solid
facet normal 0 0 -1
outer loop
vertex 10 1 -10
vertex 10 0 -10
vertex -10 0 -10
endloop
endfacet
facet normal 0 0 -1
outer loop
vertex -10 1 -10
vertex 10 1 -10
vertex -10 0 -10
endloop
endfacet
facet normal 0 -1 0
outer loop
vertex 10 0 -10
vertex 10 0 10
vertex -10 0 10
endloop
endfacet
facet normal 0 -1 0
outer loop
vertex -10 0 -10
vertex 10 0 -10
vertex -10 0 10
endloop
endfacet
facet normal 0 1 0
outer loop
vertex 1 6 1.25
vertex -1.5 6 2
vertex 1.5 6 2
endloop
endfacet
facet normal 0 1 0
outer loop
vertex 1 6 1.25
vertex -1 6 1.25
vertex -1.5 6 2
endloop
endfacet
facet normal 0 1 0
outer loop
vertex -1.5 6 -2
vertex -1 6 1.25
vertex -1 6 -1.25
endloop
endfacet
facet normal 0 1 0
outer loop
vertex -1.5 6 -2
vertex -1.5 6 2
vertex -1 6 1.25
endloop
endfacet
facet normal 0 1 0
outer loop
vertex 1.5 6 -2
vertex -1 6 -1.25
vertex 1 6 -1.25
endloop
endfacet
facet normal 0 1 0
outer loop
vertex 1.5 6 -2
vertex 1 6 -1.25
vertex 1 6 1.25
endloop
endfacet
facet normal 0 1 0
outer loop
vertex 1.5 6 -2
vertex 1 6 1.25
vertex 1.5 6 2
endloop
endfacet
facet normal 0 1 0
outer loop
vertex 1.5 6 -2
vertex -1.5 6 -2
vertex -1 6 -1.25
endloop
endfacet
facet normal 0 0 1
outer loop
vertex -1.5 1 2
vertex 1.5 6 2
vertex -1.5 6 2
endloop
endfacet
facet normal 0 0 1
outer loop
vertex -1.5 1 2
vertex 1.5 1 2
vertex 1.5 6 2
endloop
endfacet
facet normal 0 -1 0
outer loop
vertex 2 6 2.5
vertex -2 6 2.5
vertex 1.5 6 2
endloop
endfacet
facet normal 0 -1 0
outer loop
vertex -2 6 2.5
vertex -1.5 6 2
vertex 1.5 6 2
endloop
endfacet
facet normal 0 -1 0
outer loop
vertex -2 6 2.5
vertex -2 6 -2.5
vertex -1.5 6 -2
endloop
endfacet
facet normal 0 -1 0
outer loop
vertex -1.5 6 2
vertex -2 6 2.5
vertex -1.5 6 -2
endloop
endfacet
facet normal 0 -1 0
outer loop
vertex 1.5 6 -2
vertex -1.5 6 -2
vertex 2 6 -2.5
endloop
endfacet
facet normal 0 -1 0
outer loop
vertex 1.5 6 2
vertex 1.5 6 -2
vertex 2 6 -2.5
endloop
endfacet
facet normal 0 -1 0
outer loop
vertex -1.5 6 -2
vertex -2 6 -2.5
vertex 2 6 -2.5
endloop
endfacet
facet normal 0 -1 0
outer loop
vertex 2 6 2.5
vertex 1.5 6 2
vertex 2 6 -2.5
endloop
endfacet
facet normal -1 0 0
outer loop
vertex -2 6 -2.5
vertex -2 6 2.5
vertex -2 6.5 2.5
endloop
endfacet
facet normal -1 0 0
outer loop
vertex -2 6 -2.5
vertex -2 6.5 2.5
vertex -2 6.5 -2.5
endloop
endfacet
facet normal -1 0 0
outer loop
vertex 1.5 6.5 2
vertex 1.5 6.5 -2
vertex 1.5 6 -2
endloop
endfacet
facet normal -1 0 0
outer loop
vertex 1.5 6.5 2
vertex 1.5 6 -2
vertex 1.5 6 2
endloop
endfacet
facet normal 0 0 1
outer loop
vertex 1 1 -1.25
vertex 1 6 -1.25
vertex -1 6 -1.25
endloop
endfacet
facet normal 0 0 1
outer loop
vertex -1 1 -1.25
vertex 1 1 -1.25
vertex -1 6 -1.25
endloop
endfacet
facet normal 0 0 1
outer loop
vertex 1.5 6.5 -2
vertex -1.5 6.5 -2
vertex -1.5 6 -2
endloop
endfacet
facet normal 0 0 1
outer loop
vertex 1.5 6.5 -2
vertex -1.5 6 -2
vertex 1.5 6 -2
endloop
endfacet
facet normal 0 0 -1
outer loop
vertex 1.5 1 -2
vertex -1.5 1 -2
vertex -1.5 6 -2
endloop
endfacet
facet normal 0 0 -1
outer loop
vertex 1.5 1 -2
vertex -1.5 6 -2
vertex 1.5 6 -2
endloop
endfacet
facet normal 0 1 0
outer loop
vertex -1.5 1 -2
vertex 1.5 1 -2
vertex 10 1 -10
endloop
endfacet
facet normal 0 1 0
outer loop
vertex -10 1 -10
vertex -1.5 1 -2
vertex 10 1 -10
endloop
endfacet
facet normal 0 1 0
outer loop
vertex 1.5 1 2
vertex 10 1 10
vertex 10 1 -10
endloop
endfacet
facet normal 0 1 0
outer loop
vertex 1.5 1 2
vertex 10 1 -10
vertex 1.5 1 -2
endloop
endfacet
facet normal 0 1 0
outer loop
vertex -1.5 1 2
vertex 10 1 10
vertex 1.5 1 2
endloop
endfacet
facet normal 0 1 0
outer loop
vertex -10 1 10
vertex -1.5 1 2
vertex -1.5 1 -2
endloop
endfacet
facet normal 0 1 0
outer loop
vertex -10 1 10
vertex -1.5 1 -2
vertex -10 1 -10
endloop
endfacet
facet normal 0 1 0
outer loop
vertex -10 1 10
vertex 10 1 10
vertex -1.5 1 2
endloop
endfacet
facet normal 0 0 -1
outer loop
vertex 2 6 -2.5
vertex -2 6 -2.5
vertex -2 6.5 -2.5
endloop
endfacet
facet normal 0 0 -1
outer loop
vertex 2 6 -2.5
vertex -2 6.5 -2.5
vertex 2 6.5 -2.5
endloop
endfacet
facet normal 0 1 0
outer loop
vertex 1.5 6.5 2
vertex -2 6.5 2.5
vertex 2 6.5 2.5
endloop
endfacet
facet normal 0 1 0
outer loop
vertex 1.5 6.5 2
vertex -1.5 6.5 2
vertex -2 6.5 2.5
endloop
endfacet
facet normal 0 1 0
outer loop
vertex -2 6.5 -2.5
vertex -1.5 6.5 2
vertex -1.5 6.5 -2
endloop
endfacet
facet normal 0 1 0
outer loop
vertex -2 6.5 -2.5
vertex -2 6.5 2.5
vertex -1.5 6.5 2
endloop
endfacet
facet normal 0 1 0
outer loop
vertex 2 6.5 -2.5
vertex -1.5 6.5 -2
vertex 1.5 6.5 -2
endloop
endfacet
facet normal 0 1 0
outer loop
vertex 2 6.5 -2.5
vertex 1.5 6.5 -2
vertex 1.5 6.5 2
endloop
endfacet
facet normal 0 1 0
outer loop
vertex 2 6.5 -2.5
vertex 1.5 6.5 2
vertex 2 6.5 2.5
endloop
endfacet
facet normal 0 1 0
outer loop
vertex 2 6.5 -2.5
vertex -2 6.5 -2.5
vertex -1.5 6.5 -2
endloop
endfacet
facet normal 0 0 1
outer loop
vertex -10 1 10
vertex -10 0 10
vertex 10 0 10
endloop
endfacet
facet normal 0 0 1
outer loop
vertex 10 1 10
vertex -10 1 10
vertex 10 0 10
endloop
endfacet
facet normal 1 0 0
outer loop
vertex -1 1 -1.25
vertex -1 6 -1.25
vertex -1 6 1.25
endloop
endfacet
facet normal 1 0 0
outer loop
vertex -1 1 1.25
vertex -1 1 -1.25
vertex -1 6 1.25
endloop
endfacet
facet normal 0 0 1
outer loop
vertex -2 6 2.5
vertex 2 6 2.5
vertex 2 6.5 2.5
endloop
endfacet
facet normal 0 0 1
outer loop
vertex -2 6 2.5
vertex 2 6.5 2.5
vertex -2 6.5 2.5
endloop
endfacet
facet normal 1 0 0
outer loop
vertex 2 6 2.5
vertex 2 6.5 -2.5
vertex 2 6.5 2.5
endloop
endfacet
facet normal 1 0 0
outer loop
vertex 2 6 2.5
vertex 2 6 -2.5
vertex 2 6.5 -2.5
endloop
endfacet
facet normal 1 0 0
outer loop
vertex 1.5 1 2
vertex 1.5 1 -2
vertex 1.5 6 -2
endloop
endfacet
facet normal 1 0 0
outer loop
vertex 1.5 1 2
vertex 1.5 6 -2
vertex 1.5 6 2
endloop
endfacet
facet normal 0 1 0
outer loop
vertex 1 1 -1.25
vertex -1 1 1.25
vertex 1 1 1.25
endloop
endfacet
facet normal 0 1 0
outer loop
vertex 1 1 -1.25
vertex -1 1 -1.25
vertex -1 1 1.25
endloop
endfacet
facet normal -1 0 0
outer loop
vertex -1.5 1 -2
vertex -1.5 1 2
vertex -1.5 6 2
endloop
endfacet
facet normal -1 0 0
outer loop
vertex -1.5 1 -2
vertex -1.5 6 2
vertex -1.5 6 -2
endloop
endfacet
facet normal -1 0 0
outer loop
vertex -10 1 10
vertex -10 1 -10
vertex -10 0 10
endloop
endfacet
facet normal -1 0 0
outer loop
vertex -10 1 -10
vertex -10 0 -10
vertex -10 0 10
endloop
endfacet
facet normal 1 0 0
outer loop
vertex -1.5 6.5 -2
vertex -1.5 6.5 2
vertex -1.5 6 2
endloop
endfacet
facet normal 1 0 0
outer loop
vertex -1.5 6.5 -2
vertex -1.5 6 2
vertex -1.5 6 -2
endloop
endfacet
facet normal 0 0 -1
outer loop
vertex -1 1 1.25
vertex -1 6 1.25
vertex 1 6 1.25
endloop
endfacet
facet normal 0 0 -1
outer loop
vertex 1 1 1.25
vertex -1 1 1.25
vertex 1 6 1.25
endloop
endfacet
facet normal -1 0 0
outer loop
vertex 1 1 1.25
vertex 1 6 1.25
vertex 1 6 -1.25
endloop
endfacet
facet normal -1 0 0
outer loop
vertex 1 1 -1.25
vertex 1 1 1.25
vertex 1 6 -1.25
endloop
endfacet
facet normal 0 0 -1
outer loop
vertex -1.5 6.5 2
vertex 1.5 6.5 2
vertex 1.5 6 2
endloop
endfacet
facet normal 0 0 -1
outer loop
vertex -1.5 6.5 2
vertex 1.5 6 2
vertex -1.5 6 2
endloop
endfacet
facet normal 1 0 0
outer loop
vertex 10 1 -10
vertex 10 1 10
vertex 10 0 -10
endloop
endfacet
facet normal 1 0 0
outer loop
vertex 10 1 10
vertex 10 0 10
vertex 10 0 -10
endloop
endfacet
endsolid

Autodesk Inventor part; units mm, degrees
ref_plane "YZ Plane" through (0, 0, 0) normal (1, 0, 0) x (0, 1, 0)
ref_plane "XZ Plane" through (0, 0, 0) normal (0, 1, 0) x (-1, 0, 0)
ref_plane "XY Plane" through (0, 0, 0) normal (0, 0, 1) x (1, 0, 0)
sketch "草圖1" plane through (0, 0, 0) normal (0, 1, 0) x (-1, 0, 0)
  line L0 (10, 10) -> (-10, 10)
  line L1 (-10, 10) -> (-10, -10)
  line L2 (-10, -10) -> (10, -10)
  line L3 (10, -10) -> (10, 10)
  line L4 (10, 10) -> (-10, -10) construction
  line L5 (-10, 10) -> (10, -10) construction
  point P0 (0, 0)
  dimension "d0" = 20
  dimension "d1" = 20
extrude "擠出1" add sketch "草圖1" along normal blind 1
sketch "草圖2" plane through (0, 1, 0) normal (0, 1, 0) x (1, 0, 0)
  circle A0 centre (0, 0) radius 1
  line L0 (-1.5, 2) -> (1.5, 2)
  line L1 (1.5, 2) -> (1.5, -2)
  line L2 (1.5, -2) -> (-1.5, -2)
  line L3 (-1.5, -2) -> (-1.5, 2)
  line L4 (-1.5, 2) -> (1.5, -2) construction
  line L5 (1.5, 2) -> (-1.5, -2) construction
  dimension "d4" = 2
  dimension "d5" = 4
  dimension "d6" = 3
extrude "擠出2" add sketch "草圖2" along normal blind 5 contours A0 | L0 L1 L2 L3
sketch "草圖3" plane through (0, 6, 0) normal (0, 1, 0) x (1, 0, 0)
  line L0 (-1, -1.25) -> (1, -1.25)
  line L1 (1, -1.25) -> (1, 1.25)
  line L2 (1, 1.25) -> (-1, 1.25)
  line L3 (-1, 1.25) -> (-1, -1.25)
  line L4 (-1, -1.25) -> (1, 1.25) construction
  line L5 (1, -1.25) -> (-1, 1.25) construction
  point P0 (0, 0)
  dimension "d9" = 2.5
  dimension "d10" = 2
extrude "擠出3" cut sketch "草圖3" against normal blind 5
sketch "草圖4" plane through (0, 6, 0) normal (0, 1, 0) x (1, 0, 0)
  line L0 (-2, 2.5) -> (2, 2.5)
  line L1 (2, 2.5) -> (2, -2.5)
  line L2 (2, -2.5) -> (-2, -2.5)
  line L3 (-2, -2.5) -> (-2, 2.5)
  line L4 (-2, 2.5) -> (2, -2.5) construction
  line L5 (2, 2.5) -> (-2, -2.5) construction
  point P0 (0, 0)
  dimension "d13" = 4
  dimension "d14" = 5
extrude "擠出4" add sketch "草圖4" along normal blind 0.5
sketch "草圖5" plane through (0, 6.5, 0) normal (0, 1, 0) x (1, 0, 0)
  line L0 (1.5, 2) -> (1.5, -2) projected
  line L1 (-1.5, 2) -> (1.5, 2)
  line L2 (1.5, 2) -> (1.5, -2)
  line L3 (1.5, -2) -> (-1.5, -2)
  line L4 (-1.5, -2) -> (-1.5, 2)
  line L5 (-1.5, 2) -> (1.5, -2) construction
  line L6 (1.5, 2) -> (-1.5, -2) construction
  point P0 (0, 0)
extrude "擠出5" cut sketch "草圖5" against normal blind 0.5
properties part number "單線圈感測器"
